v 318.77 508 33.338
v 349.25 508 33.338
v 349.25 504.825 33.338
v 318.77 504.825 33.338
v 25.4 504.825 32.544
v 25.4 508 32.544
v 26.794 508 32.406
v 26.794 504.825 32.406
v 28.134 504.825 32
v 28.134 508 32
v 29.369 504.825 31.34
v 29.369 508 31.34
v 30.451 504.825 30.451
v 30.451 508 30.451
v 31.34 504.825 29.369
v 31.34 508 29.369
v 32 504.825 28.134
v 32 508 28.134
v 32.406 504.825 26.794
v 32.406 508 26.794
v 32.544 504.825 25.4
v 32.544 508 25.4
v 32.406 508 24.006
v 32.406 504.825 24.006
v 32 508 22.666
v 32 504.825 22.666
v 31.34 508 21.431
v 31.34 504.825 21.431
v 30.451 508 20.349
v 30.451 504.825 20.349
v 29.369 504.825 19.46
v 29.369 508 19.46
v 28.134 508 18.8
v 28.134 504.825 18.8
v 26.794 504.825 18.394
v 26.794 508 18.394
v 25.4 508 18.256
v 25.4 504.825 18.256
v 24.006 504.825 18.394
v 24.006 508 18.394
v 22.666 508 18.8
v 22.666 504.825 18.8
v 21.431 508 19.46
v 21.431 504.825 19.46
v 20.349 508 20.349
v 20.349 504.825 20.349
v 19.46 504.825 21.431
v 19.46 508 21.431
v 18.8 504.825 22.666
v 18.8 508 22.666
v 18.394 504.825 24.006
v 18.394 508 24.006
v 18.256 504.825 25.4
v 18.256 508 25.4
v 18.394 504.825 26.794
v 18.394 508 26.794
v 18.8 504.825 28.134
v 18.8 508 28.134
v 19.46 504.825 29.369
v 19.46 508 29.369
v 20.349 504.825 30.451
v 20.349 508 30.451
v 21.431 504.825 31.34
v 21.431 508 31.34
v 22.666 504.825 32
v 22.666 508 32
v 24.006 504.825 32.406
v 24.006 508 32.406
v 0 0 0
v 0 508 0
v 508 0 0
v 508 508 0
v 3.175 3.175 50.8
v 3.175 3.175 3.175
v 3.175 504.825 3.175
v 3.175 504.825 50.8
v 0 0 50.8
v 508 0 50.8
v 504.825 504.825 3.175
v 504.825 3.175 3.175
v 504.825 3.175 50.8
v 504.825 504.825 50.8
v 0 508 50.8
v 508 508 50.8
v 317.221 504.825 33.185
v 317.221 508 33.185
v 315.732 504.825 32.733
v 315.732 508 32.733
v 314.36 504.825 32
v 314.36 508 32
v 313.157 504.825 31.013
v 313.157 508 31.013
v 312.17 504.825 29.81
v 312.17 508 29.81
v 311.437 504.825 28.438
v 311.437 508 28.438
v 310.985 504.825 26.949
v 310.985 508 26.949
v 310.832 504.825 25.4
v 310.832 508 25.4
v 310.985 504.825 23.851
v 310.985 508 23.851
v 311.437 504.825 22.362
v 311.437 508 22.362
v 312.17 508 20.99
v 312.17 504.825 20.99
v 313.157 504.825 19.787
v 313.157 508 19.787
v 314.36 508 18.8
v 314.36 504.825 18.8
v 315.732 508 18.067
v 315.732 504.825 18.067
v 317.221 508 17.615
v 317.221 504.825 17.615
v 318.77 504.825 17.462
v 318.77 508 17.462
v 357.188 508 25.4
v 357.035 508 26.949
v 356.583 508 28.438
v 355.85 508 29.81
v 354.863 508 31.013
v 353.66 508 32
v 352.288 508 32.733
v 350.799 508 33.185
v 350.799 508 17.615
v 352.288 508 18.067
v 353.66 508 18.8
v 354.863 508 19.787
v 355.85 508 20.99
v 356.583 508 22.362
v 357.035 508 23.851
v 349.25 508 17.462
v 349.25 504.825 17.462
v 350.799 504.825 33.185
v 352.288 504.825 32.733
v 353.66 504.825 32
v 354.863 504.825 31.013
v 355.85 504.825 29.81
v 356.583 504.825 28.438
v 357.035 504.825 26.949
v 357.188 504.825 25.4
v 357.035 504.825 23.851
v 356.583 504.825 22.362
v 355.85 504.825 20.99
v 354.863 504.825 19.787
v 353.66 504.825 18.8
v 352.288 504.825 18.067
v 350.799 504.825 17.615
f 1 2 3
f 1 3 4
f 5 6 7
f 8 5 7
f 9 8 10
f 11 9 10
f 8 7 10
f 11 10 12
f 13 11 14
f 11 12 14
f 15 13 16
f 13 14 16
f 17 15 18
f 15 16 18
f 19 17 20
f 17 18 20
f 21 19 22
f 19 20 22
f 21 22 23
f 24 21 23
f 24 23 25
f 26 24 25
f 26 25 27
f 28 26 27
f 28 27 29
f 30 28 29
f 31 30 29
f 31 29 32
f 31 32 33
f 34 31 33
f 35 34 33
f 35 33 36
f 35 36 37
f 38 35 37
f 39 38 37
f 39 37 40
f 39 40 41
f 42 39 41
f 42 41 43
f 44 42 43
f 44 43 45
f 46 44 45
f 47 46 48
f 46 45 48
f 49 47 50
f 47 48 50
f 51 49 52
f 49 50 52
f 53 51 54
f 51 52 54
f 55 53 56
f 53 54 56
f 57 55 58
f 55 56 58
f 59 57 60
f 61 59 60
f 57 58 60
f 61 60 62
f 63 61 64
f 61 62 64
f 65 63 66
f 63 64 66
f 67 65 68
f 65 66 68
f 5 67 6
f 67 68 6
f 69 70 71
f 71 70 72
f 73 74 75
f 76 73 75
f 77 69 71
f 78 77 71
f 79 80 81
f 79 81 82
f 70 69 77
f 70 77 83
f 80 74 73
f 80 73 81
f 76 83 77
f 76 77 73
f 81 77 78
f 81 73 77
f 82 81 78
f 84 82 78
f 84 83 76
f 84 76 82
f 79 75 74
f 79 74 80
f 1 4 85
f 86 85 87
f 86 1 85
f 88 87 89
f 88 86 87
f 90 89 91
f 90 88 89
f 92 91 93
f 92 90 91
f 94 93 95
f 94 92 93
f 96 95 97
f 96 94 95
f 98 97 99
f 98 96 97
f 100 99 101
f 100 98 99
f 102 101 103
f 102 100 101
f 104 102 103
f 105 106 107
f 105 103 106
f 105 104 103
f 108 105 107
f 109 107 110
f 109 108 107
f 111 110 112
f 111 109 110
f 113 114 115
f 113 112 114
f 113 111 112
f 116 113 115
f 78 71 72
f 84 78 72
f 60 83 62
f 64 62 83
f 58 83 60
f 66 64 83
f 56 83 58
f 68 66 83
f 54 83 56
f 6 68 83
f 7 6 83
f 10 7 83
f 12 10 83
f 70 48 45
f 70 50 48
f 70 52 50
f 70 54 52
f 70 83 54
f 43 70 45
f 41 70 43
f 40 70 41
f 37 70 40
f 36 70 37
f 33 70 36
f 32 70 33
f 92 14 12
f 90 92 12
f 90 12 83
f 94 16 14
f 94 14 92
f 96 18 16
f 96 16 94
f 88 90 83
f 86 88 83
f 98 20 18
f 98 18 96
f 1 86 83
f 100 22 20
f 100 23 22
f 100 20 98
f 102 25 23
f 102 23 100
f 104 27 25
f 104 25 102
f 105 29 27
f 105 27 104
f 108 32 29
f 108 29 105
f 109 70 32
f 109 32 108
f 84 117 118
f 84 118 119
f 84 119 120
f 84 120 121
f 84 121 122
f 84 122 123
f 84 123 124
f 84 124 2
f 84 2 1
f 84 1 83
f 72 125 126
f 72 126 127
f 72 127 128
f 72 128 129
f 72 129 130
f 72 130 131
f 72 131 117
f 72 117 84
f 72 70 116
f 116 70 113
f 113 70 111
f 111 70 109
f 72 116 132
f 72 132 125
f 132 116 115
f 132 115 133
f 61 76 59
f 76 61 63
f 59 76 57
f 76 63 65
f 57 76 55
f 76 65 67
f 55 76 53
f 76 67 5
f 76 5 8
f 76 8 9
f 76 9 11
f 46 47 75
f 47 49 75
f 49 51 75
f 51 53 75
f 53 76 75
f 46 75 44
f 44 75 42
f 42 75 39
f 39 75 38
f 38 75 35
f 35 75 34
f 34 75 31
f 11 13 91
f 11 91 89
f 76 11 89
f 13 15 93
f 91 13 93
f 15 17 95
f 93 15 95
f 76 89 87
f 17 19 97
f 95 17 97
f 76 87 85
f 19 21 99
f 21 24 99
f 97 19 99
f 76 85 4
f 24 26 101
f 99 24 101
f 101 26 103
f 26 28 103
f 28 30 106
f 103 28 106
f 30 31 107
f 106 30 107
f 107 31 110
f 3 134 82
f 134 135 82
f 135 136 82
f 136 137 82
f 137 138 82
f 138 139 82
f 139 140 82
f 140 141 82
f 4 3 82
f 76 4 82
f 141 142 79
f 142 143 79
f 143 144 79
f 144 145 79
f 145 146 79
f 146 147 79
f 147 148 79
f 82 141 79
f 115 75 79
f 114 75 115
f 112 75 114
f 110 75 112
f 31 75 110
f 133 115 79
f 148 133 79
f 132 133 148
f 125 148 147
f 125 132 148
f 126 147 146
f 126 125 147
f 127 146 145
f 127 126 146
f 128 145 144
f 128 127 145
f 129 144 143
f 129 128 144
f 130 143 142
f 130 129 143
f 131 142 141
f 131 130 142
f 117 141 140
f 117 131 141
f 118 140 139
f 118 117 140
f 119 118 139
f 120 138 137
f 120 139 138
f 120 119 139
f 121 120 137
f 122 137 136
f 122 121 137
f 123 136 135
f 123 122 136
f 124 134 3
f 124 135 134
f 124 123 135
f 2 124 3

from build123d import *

# Parameters (mm, degrees)
SKETCH1_W           = 508
SKETCH1_H           = 508
BOSS_EXTRUDE1_DEPTH = 50.8
SHELL1_T            = -3.175
SKETCH2_R           = 7.14375
CUT_EXTRUDE1_DEPTH  = 417.576


with BuildPart() as part:
    # Sketch1 → Boss-Extrude1 (new body)
    with BuildSketch(Plane.XY):
        with Locations((254, 254)):
            Rectangle(SKETCH1_W, SKETCH1_H)
    extrude(amount=BOSS_EXTRUDE1_DEPTH)

    # Shell1
    shell1_openings = [part.faces().sort_by_distance(p)[0] for p in [
        (254, 254, 50.8),
    ]]
    offset(amount=SHELL1_T, openings=shell1_openings, kind=Kind.INTERSECTION)

    # Sketch2 → Cut-Extrude1 (cut)
    with BuildSketch(Plane(origin=(0, 508, 0), x_dir=(1, 0, 0), z_dir=(0, 1, 0))):
        with Locations(Location((25.4, -25.4, 0), (0, 0, 270))):
            Circle(SKETCH2_R)
        with BuildLine():
            Line((349.25, -33.3375), (318.77, -33.3375))
            ThreePointArc((318.77, -33.3375), (310.8325, -25.4), (318.77, -17.4625))
            Line((318.77, -17.4625), (349.25, -17.4625))
            ThreePointArc((349.25, -17.4625), (357.1875, -25.4), (349.25, -33.3375))
        make_face()
    extrude(amount=-CUT_EXTRUDE1_DEPTH, mode=Mode.SUBTRACT)


solid = part.part
